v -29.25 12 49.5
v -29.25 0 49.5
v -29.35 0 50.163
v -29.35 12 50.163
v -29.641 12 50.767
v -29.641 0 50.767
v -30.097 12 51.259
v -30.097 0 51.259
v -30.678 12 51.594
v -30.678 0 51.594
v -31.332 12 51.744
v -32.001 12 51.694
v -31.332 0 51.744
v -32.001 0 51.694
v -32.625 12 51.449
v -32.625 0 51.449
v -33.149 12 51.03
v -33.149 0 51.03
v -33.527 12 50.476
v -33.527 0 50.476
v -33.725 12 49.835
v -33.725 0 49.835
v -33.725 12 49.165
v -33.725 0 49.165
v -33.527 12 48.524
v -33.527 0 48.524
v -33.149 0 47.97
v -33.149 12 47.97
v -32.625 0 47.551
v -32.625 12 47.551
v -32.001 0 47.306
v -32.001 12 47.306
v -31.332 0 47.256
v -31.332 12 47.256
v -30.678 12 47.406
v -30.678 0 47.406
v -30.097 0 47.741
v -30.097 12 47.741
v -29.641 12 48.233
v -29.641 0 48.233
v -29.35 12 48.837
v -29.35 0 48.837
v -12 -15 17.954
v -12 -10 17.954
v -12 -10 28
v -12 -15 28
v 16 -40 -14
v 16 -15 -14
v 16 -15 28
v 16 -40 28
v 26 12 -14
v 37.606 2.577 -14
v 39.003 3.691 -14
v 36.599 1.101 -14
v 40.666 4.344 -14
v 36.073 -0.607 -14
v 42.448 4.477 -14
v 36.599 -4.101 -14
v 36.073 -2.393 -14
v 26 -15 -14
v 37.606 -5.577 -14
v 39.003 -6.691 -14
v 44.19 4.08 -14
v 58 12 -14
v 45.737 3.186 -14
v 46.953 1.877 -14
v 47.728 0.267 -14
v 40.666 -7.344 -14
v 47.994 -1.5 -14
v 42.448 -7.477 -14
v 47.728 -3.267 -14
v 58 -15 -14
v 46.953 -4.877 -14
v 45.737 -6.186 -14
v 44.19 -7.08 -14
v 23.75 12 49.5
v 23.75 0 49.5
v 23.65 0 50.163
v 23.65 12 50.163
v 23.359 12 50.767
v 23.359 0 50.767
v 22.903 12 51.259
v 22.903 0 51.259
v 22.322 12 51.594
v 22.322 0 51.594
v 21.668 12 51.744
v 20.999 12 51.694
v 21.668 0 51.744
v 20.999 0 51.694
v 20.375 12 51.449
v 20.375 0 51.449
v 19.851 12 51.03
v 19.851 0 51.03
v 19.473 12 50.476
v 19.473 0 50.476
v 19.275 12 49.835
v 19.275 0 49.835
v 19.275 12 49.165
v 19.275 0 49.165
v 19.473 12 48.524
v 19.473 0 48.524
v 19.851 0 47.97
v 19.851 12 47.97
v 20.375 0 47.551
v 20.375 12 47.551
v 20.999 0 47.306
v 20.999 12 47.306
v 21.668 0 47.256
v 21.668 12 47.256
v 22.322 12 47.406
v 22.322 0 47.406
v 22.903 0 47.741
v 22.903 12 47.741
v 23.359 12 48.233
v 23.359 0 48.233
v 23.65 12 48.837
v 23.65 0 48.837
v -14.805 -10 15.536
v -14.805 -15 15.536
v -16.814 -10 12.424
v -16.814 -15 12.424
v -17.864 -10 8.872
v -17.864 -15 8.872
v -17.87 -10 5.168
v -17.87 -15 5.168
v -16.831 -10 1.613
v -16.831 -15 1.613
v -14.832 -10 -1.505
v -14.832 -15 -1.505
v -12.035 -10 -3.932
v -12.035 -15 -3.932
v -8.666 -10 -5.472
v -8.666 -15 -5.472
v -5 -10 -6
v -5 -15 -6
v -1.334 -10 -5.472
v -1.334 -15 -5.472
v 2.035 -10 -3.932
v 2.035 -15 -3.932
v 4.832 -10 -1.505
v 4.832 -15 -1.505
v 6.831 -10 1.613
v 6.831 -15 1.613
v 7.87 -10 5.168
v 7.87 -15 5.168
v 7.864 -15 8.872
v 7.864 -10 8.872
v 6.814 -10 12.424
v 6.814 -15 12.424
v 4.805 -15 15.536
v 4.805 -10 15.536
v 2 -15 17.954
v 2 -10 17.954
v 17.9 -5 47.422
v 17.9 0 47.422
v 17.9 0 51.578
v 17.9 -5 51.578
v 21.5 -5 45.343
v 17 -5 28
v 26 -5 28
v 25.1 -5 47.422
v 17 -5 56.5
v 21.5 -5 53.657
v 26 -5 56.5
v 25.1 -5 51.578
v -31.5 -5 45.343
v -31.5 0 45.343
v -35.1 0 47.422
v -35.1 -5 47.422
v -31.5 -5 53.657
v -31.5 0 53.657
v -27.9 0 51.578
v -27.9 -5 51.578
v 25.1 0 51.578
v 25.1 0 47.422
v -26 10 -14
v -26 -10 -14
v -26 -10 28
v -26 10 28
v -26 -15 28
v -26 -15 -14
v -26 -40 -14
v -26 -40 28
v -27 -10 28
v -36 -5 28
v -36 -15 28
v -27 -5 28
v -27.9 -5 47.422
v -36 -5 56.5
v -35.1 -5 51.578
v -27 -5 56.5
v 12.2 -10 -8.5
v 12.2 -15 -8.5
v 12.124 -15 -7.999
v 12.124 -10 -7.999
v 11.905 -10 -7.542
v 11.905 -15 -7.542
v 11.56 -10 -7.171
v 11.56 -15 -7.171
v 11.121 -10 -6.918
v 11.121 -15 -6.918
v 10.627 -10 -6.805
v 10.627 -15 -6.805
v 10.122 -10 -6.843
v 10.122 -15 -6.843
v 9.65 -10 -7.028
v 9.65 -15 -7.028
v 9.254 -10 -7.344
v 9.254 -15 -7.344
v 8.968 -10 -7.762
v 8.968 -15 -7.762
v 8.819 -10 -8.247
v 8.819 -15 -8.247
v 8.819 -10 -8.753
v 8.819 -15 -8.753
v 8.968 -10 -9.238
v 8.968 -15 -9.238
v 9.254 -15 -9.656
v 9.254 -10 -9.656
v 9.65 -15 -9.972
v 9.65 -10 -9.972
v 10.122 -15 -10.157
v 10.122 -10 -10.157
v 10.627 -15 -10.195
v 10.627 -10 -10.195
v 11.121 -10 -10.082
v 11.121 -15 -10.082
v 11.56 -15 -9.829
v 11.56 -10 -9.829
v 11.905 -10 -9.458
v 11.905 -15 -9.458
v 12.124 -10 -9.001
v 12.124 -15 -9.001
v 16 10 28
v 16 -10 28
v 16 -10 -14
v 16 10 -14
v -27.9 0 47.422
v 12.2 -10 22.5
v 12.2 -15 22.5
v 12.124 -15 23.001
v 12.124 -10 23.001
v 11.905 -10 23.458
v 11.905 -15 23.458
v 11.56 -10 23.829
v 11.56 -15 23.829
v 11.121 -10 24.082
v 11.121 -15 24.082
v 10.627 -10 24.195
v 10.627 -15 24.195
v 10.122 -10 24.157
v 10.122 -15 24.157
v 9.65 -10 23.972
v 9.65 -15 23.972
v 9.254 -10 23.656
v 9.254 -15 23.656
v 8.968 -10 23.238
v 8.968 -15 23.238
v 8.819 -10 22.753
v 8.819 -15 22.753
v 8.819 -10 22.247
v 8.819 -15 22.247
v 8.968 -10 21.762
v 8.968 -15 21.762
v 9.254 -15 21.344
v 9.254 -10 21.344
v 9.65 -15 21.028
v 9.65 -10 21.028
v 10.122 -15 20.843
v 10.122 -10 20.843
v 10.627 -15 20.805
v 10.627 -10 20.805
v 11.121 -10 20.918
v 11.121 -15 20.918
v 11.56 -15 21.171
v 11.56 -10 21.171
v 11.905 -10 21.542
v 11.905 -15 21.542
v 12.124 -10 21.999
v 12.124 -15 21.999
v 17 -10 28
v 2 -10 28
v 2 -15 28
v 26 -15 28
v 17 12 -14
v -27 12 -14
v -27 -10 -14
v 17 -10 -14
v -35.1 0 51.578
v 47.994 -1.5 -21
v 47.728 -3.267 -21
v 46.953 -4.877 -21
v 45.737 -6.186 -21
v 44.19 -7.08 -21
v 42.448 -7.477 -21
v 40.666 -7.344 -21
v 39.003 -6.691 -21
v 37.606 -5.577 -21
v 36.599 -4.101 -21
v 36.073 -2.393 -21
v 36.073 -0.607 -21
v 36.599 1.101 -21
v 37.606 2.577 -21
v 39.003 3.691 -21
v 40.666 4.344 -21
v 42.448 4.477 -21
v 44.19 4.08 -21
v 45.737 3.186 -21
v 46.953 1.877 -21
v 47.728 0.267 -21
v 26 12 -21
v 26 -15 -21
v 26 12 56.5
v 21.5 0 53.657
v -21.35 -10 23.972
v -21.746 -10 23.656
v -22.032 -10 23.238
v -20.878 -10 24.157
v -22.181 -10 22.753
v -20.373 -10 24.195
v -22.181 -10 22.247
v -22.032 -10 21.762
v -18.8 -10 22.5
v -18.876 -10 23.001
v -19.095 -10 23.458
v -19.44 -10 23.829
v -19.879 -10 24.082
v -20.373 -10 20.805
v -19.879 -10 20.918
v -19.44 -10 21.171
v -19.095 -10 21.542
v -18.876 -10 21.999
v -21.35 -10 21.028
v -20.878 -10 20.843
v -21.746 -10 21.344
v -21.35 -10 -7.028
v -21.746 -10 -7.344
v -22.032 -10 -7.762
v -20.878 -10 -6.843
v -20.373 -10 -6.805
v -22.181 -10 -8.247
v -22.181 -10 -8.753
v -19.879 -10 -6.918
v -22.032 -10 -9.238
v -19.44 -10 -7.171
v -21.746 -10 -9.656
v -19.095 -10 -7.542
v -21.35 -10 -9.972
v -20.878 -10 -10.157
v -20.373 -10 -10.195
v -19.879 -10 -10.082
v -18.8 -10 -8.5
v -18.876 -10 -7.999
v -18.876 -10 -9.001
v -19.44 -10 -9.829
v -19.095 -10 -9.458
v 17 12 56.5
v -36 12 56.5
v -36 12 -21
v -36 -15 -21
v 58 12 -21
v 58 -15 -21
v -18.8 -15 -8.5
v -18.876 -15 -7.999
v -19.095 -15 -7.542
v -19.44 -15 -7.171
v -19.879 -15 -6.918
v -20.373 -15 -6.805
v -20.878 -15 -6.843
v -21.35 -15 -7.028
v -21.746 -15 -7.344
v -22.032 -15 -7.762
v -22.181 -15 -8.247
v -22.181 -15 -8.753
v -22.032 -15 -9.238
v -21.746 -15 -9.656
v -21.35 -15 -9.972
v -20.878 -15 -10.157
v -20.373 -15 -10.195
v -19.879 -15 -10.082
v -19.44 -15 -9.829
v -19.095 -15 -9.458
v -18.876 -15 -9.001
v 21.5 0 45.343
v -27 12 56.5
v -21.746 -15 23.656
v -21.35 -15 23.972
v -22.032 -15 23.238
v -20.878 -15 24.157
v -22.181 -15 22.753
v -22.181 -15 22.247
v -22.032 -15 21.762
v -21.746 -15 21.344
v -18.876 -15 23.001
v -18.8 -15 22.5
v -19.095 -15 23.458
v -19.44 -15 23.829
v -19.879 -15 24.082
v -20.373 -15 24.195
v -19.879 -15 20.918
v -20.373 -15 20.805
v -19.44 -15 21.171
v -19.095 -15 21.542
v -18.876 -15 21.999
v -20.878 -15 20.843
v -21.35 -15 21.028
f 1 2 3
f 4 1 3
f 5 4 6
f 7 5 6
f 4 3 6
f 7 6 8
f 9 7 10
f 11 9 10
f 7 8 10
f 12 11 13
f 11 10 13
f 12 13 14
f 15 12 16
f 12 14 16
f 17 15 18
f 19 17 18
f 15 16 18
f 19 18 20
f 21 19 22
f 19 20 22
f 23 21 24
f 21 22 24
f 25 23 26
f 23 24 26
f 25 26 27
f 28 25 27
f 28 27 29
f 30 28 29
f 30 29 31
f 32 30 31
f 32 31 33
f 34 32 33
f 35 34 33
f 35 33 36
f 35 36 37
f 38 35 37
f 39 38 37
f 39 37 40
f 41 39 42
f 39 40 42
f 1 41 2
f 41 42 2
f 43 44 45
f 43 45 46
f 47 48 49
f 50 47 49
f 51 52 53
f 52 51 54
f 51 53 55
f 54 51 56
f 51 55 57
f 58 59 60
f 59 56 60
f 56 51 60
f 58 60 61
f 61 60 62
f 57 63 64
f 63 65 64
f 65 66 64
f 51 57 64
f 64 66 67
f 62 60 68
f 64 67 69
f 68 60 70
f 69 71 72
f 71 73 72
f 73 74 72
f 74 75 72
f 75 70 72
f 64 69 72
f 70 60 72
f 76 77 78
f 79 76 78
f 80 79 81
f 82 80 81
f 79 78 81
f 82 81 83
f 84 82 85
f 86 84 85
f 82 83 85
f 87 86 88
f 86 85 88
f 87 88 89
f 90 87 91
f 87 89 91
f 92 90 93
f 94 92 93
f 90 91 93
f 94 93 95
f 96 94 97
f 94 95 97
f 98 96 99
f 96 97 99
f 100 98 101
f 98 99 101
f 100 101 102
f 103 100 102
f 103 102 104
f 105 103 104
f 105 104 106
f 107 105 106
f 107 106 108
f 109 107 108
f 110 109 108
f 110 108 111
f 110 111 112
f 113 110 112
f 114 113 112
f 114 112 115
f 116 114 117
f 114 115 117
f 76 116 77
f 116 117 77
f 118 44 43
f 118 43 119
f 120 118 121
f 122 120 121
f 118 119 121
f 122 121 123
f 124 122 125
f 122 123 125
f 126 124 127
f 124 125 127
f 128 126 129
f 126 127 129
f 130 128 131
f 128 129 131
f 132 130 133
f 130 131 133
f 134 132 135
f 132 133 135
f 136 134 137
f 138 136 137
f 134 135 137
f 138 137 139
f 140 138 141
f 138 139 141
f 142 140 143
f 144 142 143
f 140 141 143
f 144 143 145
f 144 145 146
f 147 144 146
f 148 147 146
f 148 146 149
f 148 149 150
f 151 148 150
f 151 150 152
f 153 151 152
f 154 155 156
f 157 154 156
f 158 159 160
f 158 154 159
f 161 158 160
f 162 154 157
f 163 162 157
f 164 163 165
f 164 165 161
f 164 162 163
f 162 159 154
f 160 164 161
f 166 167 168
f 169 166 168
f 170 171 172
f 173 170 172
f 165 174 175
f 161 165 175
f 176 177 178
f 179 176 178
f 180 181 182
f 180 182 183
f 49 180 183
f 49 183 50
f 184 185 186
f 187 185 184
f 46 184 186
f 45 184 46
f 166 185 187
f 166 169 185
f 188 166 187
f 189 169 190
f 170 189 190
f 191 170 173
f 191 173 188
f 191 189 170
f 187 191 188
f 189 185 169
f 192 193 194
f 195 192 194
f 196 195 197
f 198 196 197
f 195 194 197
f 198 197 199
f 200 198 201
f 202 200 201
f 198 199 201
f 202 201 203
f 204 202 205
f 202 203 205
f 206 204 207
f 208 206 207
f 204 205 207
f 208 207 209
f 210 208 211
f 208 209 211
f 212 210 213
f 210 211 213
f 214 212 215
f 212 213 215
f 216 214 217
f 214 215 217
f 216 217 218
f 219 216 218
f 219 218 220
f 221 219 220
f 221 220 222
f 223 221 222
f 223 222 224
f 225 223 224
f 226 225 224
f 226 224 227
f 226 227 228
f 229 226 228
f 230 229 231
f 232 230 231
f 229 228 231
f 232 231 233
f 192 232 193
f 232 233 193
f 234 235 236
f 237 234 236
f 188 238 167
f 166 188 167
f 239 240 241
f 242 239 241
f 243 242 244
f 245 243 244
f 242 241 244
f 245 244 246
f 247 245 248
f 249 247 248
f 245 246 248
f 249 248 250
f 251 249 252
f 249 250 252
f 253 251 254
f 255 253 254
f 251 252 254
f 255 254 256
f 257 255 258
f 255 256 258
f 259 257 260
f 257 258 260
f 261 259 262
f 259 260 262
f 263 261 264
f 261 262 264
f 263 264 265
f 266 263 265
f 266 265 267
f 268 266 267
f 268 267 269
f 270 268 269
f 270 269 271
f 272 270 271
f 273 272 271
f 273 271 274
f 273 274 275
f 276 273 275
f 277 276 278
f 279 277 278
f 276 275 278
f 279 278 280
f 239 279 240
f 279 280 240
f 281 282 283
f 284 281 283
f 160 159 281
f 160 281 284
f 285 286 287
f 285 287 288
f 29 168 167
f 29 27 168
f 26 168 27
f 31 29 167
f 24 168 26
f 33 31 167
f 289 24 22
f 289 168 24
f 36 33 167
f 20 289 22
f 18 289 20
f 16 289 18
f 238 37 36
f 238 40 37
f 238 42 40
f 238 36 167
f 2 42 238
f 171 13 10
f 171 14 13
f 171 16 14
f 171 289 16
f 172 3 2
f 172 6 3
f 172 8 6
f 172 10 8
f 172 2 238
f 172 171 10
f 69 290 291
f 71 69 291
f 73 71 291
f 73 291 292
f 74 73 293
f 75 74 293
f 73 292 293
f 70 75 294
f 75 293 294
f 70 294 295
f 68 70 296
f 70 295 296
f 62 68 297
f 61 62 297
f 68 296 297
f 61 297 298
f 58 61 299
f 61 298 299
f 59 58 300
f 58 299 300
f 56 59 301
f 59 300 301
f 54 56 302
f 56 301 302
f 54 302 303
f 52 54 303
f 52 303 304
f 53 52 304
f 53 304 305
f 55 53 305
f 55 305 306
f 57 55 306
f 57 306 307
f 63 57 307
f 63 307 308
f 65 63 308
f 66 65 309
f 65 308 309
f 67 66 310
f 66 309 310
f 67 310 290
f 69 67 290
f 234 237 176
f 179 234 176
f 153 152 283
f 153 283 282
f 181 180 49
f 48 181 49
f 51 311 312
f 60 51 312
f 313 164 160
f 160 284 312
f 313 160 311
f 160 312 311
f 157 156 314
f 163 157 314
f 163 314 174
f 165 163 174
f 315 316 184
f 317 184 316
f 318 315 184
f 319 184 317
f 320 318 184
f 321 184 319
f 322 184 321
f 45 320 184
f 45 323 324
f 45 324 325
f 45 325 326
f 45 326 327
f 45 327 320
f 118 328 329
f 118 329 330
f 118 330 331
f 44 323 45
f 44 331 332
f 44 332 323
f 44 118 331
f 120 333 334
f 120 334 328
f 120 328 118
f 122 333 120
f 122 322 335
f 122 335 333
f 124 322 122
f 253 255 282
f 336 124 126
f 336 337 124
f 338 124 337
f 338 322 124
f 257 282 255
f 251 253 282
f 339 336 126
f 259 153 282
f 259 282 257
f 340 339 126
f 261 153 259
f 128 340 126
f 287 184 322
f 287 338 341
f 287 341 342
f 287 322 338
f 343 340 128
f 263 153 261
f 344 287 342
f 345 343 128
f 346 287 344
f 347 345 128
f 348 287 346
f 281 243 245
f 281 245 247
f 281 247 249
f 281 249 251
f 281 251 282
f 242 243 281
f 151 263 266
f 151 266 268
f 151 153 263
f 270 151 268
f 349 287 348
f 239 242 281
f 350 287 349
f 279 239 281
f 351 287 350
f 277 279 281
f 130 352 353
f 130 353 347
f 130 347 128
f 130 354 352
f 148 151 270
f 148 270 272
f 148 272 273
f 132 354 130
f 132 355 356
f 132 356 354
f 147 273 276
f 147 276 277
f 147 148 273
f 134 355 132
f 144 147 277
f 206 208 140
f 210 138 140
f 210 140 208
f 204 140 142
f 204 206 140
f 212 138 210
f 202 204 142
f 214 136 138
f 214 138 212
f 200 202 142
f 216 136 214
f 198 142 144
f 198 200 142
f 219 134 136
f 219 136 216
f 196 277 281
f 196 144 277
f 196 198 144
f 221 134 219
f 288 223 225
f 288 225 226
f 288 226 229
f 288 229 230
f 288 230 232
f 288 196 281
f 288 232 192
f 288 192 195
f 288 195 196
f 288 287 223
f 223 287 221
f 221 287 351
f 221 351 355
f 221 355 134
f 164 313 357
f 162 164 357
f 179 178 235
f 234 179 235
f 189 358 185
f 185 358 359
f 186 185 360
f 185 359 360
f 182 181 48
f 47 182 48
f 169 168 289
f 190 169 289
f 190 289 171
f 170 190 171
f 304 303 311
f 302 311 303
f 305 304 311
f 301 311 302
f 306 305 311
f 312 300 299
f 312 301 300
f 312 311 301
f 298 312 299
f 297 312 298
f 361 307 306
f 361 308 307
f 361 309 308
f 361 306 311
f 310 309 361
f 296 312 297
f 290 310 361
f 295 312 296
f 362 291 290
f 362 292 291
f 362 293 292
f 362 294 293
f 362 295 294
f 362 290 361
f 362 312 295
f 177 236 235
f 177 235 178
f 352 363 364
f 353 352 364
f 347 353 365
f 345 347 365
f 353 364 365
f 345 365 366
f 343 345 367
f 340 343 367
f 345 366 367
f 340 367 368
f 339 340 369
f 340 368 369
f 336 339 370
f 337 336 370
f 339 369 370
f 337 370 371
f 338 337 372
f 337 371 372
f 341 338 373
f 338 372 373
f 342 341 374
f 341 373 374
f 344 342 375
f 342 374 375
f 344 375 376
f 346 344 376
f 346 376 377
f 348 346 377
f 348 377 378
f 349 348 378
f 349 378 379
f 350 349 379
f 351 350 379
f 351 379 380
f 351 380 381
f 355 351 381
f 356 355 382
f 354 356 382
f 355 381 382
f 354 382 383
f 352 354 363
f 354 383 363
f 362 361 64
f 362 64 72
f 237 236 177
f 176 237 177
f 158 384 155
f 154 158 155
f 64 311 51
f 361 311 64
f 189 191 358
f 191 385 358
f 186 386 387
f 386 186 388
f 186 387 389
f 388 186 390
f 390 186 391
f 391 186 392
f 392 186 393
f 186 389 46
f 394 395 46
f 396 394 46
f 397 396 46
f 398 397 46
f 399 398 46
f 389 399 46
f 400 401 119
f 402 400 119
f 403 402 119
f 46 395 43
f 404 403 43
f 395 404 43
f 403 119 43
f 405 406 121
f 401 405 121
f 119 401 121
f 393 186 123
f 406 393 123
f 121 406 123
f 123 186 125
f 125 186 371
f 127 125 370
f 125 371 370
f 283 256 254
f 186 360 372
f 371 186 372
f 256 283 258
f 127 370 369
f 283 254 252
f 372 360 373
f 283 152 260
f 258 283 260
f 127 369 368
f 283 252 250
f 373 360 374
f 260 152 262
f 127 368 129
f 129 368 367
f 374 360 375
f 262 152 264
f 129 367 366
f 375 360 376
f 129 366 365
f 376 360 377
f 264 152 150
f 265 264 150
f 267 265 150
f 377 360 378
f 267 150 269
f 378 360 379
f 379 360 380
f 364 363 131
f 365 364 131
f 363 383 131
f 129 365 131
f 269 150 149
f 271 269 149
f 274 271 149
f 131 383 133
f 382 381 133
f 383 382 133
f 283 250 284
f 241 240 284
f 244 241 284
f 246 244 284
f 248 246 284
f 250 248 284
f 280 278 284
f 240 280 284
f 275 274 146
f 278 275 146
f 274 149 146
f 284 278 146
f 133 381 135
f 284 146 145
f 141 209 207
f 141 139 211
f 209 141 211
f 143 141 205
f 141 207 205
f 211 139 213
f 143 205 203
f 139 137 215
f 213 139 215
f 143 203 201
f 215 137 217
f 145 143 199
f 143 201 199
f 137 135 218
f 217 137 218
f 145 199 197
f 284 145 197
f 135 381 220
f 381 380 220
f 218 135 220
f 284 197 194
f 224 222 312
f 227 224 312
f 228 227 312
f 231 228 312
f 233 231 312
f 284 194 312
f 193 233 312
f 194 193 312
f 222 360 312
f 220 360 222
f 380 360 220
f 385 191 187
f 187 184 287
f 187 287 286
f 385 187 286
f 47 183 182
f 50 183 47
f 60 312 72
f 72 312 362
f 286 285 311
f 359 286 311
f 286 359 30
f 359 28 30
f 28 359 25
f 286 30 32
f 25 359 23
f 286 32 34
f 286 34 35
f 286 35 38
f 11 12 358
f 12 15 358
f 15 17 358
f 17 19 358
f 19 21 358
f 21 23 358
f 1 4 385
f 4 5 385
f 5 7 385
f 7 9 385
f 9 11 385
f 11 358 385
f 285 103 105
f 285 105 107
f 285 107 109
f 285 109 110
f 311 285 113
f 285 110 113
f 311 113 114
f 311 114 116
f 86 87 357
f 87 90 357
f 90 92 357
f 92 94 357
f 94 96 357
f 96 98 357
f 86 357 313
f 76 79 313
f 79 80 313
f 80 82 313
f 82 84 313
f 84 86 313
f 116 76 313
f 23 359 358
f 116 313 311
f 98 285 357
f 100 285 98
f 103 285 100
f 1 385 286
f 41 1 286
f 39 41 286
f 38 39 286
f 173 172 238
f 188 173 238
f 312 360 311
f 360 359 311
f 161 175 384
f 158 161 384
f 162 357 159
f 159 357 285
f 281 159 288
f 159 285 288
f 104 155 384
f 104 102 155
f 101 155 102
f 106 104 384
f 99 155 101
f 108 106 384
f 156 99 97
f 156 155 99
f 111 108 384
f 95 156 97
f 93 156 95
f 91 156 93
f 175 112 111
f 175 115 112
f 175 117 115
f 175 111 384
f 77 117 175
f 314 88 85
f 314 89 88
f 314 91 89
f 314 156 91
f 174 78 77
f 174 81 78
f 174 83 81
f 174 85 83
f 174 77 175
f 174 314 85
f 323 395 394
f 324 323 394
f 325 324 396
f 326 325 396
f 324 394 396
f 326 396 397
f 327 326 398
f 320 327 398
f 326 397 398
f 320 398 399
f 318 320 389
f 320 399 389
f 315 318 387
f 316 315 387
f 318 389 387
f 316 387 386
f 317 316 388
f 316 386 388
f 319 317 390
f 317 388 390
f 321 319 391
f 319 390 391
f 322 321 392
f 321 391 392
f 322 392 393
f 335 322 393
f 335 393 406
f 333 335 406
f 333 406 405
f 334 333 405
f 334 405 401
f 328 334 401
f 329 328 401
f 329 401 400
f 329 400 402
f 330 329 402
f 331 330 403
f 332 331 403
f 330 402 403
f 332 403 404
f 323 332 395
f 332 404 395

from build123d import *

# Parameters (mm, degrees)
F1_R      = 2.25
F2_DEPTH  = 12
F4_DEPTH  = 5
F5_W      = 44
F5_H      = 5
F6_DEPTH  = 7
F7_DEPTH  = 42
F8_R      = 1.7
F8_R_2    = 13
F9_DEPTH  = 5
F11_REACH = 63.8670687473
F12_R     = 1.7
F13_DEPTH = 20
F14_W     = 42
F14_H     = 42
F14_R     = 1.7
F14_R_2   = 13
F15_DEPTH = 25
F16_W     = 32
F16_H     = 27
F16_R     = 5.9941661127
F17_DEPTH = 7


with BuildPart() as f2:
    # F1 (on Front) → F2 (new body)
    with BuildSketch(Plane.XZ):
        Polygon((-27, 56.5), (-36, 56.5), (-36, -21), (26, -21), (26, 56.5), (17, 56.5), (17, -14), (-27, -14), align=None)
        with Locations((-31.5, 49.5)):
            Circle(F1_R, mode=Mode.SUBTRACT)
        with Locations((21.5, 49.5)):
            Circle(F1_R, mode=Mode.SUBTRACT)
    extrude(amount=-F2_DEPTH)

    # F3 (on face) → F4 (join)
    with BuildSketch(Plane.XZ):
        Polygon((-27, -14), (-27, 56.5), (-36, 56.5), (-36, -21), (26, -21), (26, 56.5), (17, 56.5), (17, -14), align=None)
        Polygon((-31.5, 53.6569219382), (-27.9, 51.5784609691), (-27.9, 47.4215390309), (-31.5, 45.3430780618), (-35.1, 47.4215390309), (-35.1, 51.5784609691), align=None, mode=Mode.SUBTRACT)
        Polygon((21.5, 53.6569219382), (25.1, 51.5784609691), (25.1, 47.4215390309), (21.5, 45.3430780618), (17.9, 47.4215390309), (17.9, 51.5784609691), align=None, mode=Mode.SUBTRACT)
    extrude(amount=F4_DEPTH)

    # F5 (on face) → F6 (join, through all)
    with BuildSketch(Plane.XY.offset(-14)):
        with Locations((-5, -7.5)):
            Rectangle(F5_W, F5_H)
        with Locations((-5, -12.5)):
            Rectangle(F5_W, F5_H)
        Polygon((-27, -10), (-27, -5), (-36, -5), (-36, -15), (-27, -15), align=None)
        Polygon((26, -5), (17, -5), (17, -10), (17, -15), (26, -15), align=None)
    extrude(amount=-F6_DEPTH)

    # F5 (on face) → F7 (join)
    with BuildSketch(Plane.XY.offset(-14)):
        with Locations((-5, -12.5)):
            Rectangle(F5_W, F5_H)
        Polygon((-27, -10), (-27, -5), (-36, -5), (-36, -15), (-27, -15), align=None)
        Polygon((26, -5), (17, -5), (17, -10), (17, -15), (26, -15), align=None)
    extrude(amount=F7_DEPTH)

    # F8 (on face) → F9 (cut, through all)
    with BuildSketch(Plane.XZ.offset(15)):
        with Locations((-20.5, 22.5)):
            Circle(F8_R)
        with Locations((-5, 7)):
            Circle(F8_R_2)
        with Locations((-20.5, -8.5)):
            Circle(F8_R)
        with Locations((10.5, -8.5)):
            Circle(F8_R)
        with Locations((10.5, 22.5)):
            Circle(F8_R)
    extrude(amount=-F9_DEPTH, mode=Mode.SUBTRACT)

    f11_end = f2.faces().sort_by_distance((-18, -12.5, 7))[0]
    # F10 (on face) → F11 (cut, up to a face of the model that its end follows)
    with BuildSketch(Plane.XY.offset(28)):
        Polygon((2, -10), (-5, -10), (-12, -10), (-12, -15), (2, -15), align=None)
    f11_long = extrude(amount=-F11_REACH, mode=Mode.PRIVATE)
    add(split(f11_long, bisect_by=f11_end, keep=Keep.ALL, mode=Mode.PRIVATE).solids().sort_by_distance((-5, -12.5, 28))[0], mode=Mode.SUBTRACT)


with BuildPart() as f13:
    # F12 (on face) → F13 (new body)
    with BuildSketch(Plane(origin=(0, -10, 0), x_dir=(-1, 0, 0), z_dir=(0, 1, 0))):
        with BuildLine():
            Line((-16, -14), (26, -14))
            Line((26, -14), (26, 28))
            Line((26, 28), (12, 28))
            Line((12, 28), (12, 17.9544511501))
            ThreePointArc((12, 17.9544511501), (5, -6), (-2, 17.9544511501))
            Line((-2, 17.9544511501), (-2, 28))
            Line((-2, 28), (-16, 28))
            Line((-16, 28), (-16, -14))
        make_face()
        with Locations((-10.5, -8.5)):
            Circle(F12_R, mode=Mode.SUBTRACT)
        with Locations((20.5, -8.5)):
            Circle(F12_R, mode=Mode.SUBTRACT)
        with Locations((-10.5, 22.5)):
            Circle(F12_R, mode=Mode.SUBTRACT)
        with Locations((20.5, 22.5)):
            Circle(F12_R, mode=Mode.SUBTRACT)
        with BuildLine():
            Line((12, 17.9544511501), (12, 28))
            Line((12, 28), (-2, 28))
            Line((-2, 28), (-2, 17.9544511501))
            ThreePointArc((-2, 17.9544511501), (5, -6), (12, 17.9544511501))
        make_face()
        with Locations((-10.5, 22.5)):
            Circle(F12_R)
        with Locations((20.5, 22.5)):
            Circle(F12_R)
        with Locations((-10.5, -8.5)):
            Circle(F12_R)
        with Locations((20.5, -8.5)):
            Circle(F12_R)
    extrude(amount=F13_DEPTH)


with BuildPart() as f15:
    # F14 (on face) → F15 (new body)
    with BuildSketch(Plane.XZ.offset(15)):
        with Locations((-5, 7)):
            Rectangle(F14_W, F14_H)
        with Locations((-20.5, -8.5)):
            Circle(F14_R, mode=Mode.SUBTRACT)
        with Locations((10.5, -8.5)):
            Circle(F14_R, mode=Mode.SUBTRACT)
        with Locations((-20.5, 22.5)):
            Circle(F14_R, mode=Mode.SUBTRACT)
        with Locations((-5, 7)):
            Circle(F14_R_2, mode=Mode.SUBTRACT)
        with Locations((10.5, 22.5)):
            Circle(F14_R, mode=Mode.SUBTRACT)
    extrude(amount=F15_DEPTH)

    # F8 (on face) → F15, piece 2 (join)
    with BuildSketch(Plane.XZ.offset(15)):
        with Locations((-20.5, 22.5)):
            Circle(F8_R)
    extrude(amount=F15_DEPTH)

    # F8 (on face) → F15, piece 3 (join)
    with BuildSketch(Plane.XZ.offset(15)):
        with Locations((-5, 7)):
            Circle(F8_R_2)
    extrude(amount=F15_DEPTH)

    # F8 (on face) → F15, piece 4 (join)
    with BuildSketch(Plane.XZ.offset(15)):
        with Locations((-20.5, -8.5)):
            Circle(F8_R)
    extrude(amount=F15_DEPTH)

    # F8 (on face) → F15, piece 5 (join)
    with BuildSketch(Plane.XZ.offset(15)):
        with Locations((10.5, 22.5)):
            Circle(F8_R)
    extrude(amount=F15_DEPTH)

    # F8 (on face) → F15, piece 6 (join)
    with BuildSketch(Plane.XZ.offset(15)):
        with Locations((10.5, -8.5)):
            Circle(F8_R)
    extrude(amount=F15_DEPTH)


with BuildPart() as f17:
    # F16 (on face) → F17 (new body, through all)
    with BuildSketch(Plane(origin=(0, 0, -21), x_dir=(1, 0, 0), z_dir=(0, 0, -1))):
        with Locations((42, 1.5)):
            Rectangle(F16_W, F16_H)
        with Locations((42, 1.5)):
            Circle(F16_R, mode=Mode.SUBTRACT)
    extrude(amount=-F17_DEPTH)


solid = Compound([f2.part, f13.part, f15.part, f17.part])
